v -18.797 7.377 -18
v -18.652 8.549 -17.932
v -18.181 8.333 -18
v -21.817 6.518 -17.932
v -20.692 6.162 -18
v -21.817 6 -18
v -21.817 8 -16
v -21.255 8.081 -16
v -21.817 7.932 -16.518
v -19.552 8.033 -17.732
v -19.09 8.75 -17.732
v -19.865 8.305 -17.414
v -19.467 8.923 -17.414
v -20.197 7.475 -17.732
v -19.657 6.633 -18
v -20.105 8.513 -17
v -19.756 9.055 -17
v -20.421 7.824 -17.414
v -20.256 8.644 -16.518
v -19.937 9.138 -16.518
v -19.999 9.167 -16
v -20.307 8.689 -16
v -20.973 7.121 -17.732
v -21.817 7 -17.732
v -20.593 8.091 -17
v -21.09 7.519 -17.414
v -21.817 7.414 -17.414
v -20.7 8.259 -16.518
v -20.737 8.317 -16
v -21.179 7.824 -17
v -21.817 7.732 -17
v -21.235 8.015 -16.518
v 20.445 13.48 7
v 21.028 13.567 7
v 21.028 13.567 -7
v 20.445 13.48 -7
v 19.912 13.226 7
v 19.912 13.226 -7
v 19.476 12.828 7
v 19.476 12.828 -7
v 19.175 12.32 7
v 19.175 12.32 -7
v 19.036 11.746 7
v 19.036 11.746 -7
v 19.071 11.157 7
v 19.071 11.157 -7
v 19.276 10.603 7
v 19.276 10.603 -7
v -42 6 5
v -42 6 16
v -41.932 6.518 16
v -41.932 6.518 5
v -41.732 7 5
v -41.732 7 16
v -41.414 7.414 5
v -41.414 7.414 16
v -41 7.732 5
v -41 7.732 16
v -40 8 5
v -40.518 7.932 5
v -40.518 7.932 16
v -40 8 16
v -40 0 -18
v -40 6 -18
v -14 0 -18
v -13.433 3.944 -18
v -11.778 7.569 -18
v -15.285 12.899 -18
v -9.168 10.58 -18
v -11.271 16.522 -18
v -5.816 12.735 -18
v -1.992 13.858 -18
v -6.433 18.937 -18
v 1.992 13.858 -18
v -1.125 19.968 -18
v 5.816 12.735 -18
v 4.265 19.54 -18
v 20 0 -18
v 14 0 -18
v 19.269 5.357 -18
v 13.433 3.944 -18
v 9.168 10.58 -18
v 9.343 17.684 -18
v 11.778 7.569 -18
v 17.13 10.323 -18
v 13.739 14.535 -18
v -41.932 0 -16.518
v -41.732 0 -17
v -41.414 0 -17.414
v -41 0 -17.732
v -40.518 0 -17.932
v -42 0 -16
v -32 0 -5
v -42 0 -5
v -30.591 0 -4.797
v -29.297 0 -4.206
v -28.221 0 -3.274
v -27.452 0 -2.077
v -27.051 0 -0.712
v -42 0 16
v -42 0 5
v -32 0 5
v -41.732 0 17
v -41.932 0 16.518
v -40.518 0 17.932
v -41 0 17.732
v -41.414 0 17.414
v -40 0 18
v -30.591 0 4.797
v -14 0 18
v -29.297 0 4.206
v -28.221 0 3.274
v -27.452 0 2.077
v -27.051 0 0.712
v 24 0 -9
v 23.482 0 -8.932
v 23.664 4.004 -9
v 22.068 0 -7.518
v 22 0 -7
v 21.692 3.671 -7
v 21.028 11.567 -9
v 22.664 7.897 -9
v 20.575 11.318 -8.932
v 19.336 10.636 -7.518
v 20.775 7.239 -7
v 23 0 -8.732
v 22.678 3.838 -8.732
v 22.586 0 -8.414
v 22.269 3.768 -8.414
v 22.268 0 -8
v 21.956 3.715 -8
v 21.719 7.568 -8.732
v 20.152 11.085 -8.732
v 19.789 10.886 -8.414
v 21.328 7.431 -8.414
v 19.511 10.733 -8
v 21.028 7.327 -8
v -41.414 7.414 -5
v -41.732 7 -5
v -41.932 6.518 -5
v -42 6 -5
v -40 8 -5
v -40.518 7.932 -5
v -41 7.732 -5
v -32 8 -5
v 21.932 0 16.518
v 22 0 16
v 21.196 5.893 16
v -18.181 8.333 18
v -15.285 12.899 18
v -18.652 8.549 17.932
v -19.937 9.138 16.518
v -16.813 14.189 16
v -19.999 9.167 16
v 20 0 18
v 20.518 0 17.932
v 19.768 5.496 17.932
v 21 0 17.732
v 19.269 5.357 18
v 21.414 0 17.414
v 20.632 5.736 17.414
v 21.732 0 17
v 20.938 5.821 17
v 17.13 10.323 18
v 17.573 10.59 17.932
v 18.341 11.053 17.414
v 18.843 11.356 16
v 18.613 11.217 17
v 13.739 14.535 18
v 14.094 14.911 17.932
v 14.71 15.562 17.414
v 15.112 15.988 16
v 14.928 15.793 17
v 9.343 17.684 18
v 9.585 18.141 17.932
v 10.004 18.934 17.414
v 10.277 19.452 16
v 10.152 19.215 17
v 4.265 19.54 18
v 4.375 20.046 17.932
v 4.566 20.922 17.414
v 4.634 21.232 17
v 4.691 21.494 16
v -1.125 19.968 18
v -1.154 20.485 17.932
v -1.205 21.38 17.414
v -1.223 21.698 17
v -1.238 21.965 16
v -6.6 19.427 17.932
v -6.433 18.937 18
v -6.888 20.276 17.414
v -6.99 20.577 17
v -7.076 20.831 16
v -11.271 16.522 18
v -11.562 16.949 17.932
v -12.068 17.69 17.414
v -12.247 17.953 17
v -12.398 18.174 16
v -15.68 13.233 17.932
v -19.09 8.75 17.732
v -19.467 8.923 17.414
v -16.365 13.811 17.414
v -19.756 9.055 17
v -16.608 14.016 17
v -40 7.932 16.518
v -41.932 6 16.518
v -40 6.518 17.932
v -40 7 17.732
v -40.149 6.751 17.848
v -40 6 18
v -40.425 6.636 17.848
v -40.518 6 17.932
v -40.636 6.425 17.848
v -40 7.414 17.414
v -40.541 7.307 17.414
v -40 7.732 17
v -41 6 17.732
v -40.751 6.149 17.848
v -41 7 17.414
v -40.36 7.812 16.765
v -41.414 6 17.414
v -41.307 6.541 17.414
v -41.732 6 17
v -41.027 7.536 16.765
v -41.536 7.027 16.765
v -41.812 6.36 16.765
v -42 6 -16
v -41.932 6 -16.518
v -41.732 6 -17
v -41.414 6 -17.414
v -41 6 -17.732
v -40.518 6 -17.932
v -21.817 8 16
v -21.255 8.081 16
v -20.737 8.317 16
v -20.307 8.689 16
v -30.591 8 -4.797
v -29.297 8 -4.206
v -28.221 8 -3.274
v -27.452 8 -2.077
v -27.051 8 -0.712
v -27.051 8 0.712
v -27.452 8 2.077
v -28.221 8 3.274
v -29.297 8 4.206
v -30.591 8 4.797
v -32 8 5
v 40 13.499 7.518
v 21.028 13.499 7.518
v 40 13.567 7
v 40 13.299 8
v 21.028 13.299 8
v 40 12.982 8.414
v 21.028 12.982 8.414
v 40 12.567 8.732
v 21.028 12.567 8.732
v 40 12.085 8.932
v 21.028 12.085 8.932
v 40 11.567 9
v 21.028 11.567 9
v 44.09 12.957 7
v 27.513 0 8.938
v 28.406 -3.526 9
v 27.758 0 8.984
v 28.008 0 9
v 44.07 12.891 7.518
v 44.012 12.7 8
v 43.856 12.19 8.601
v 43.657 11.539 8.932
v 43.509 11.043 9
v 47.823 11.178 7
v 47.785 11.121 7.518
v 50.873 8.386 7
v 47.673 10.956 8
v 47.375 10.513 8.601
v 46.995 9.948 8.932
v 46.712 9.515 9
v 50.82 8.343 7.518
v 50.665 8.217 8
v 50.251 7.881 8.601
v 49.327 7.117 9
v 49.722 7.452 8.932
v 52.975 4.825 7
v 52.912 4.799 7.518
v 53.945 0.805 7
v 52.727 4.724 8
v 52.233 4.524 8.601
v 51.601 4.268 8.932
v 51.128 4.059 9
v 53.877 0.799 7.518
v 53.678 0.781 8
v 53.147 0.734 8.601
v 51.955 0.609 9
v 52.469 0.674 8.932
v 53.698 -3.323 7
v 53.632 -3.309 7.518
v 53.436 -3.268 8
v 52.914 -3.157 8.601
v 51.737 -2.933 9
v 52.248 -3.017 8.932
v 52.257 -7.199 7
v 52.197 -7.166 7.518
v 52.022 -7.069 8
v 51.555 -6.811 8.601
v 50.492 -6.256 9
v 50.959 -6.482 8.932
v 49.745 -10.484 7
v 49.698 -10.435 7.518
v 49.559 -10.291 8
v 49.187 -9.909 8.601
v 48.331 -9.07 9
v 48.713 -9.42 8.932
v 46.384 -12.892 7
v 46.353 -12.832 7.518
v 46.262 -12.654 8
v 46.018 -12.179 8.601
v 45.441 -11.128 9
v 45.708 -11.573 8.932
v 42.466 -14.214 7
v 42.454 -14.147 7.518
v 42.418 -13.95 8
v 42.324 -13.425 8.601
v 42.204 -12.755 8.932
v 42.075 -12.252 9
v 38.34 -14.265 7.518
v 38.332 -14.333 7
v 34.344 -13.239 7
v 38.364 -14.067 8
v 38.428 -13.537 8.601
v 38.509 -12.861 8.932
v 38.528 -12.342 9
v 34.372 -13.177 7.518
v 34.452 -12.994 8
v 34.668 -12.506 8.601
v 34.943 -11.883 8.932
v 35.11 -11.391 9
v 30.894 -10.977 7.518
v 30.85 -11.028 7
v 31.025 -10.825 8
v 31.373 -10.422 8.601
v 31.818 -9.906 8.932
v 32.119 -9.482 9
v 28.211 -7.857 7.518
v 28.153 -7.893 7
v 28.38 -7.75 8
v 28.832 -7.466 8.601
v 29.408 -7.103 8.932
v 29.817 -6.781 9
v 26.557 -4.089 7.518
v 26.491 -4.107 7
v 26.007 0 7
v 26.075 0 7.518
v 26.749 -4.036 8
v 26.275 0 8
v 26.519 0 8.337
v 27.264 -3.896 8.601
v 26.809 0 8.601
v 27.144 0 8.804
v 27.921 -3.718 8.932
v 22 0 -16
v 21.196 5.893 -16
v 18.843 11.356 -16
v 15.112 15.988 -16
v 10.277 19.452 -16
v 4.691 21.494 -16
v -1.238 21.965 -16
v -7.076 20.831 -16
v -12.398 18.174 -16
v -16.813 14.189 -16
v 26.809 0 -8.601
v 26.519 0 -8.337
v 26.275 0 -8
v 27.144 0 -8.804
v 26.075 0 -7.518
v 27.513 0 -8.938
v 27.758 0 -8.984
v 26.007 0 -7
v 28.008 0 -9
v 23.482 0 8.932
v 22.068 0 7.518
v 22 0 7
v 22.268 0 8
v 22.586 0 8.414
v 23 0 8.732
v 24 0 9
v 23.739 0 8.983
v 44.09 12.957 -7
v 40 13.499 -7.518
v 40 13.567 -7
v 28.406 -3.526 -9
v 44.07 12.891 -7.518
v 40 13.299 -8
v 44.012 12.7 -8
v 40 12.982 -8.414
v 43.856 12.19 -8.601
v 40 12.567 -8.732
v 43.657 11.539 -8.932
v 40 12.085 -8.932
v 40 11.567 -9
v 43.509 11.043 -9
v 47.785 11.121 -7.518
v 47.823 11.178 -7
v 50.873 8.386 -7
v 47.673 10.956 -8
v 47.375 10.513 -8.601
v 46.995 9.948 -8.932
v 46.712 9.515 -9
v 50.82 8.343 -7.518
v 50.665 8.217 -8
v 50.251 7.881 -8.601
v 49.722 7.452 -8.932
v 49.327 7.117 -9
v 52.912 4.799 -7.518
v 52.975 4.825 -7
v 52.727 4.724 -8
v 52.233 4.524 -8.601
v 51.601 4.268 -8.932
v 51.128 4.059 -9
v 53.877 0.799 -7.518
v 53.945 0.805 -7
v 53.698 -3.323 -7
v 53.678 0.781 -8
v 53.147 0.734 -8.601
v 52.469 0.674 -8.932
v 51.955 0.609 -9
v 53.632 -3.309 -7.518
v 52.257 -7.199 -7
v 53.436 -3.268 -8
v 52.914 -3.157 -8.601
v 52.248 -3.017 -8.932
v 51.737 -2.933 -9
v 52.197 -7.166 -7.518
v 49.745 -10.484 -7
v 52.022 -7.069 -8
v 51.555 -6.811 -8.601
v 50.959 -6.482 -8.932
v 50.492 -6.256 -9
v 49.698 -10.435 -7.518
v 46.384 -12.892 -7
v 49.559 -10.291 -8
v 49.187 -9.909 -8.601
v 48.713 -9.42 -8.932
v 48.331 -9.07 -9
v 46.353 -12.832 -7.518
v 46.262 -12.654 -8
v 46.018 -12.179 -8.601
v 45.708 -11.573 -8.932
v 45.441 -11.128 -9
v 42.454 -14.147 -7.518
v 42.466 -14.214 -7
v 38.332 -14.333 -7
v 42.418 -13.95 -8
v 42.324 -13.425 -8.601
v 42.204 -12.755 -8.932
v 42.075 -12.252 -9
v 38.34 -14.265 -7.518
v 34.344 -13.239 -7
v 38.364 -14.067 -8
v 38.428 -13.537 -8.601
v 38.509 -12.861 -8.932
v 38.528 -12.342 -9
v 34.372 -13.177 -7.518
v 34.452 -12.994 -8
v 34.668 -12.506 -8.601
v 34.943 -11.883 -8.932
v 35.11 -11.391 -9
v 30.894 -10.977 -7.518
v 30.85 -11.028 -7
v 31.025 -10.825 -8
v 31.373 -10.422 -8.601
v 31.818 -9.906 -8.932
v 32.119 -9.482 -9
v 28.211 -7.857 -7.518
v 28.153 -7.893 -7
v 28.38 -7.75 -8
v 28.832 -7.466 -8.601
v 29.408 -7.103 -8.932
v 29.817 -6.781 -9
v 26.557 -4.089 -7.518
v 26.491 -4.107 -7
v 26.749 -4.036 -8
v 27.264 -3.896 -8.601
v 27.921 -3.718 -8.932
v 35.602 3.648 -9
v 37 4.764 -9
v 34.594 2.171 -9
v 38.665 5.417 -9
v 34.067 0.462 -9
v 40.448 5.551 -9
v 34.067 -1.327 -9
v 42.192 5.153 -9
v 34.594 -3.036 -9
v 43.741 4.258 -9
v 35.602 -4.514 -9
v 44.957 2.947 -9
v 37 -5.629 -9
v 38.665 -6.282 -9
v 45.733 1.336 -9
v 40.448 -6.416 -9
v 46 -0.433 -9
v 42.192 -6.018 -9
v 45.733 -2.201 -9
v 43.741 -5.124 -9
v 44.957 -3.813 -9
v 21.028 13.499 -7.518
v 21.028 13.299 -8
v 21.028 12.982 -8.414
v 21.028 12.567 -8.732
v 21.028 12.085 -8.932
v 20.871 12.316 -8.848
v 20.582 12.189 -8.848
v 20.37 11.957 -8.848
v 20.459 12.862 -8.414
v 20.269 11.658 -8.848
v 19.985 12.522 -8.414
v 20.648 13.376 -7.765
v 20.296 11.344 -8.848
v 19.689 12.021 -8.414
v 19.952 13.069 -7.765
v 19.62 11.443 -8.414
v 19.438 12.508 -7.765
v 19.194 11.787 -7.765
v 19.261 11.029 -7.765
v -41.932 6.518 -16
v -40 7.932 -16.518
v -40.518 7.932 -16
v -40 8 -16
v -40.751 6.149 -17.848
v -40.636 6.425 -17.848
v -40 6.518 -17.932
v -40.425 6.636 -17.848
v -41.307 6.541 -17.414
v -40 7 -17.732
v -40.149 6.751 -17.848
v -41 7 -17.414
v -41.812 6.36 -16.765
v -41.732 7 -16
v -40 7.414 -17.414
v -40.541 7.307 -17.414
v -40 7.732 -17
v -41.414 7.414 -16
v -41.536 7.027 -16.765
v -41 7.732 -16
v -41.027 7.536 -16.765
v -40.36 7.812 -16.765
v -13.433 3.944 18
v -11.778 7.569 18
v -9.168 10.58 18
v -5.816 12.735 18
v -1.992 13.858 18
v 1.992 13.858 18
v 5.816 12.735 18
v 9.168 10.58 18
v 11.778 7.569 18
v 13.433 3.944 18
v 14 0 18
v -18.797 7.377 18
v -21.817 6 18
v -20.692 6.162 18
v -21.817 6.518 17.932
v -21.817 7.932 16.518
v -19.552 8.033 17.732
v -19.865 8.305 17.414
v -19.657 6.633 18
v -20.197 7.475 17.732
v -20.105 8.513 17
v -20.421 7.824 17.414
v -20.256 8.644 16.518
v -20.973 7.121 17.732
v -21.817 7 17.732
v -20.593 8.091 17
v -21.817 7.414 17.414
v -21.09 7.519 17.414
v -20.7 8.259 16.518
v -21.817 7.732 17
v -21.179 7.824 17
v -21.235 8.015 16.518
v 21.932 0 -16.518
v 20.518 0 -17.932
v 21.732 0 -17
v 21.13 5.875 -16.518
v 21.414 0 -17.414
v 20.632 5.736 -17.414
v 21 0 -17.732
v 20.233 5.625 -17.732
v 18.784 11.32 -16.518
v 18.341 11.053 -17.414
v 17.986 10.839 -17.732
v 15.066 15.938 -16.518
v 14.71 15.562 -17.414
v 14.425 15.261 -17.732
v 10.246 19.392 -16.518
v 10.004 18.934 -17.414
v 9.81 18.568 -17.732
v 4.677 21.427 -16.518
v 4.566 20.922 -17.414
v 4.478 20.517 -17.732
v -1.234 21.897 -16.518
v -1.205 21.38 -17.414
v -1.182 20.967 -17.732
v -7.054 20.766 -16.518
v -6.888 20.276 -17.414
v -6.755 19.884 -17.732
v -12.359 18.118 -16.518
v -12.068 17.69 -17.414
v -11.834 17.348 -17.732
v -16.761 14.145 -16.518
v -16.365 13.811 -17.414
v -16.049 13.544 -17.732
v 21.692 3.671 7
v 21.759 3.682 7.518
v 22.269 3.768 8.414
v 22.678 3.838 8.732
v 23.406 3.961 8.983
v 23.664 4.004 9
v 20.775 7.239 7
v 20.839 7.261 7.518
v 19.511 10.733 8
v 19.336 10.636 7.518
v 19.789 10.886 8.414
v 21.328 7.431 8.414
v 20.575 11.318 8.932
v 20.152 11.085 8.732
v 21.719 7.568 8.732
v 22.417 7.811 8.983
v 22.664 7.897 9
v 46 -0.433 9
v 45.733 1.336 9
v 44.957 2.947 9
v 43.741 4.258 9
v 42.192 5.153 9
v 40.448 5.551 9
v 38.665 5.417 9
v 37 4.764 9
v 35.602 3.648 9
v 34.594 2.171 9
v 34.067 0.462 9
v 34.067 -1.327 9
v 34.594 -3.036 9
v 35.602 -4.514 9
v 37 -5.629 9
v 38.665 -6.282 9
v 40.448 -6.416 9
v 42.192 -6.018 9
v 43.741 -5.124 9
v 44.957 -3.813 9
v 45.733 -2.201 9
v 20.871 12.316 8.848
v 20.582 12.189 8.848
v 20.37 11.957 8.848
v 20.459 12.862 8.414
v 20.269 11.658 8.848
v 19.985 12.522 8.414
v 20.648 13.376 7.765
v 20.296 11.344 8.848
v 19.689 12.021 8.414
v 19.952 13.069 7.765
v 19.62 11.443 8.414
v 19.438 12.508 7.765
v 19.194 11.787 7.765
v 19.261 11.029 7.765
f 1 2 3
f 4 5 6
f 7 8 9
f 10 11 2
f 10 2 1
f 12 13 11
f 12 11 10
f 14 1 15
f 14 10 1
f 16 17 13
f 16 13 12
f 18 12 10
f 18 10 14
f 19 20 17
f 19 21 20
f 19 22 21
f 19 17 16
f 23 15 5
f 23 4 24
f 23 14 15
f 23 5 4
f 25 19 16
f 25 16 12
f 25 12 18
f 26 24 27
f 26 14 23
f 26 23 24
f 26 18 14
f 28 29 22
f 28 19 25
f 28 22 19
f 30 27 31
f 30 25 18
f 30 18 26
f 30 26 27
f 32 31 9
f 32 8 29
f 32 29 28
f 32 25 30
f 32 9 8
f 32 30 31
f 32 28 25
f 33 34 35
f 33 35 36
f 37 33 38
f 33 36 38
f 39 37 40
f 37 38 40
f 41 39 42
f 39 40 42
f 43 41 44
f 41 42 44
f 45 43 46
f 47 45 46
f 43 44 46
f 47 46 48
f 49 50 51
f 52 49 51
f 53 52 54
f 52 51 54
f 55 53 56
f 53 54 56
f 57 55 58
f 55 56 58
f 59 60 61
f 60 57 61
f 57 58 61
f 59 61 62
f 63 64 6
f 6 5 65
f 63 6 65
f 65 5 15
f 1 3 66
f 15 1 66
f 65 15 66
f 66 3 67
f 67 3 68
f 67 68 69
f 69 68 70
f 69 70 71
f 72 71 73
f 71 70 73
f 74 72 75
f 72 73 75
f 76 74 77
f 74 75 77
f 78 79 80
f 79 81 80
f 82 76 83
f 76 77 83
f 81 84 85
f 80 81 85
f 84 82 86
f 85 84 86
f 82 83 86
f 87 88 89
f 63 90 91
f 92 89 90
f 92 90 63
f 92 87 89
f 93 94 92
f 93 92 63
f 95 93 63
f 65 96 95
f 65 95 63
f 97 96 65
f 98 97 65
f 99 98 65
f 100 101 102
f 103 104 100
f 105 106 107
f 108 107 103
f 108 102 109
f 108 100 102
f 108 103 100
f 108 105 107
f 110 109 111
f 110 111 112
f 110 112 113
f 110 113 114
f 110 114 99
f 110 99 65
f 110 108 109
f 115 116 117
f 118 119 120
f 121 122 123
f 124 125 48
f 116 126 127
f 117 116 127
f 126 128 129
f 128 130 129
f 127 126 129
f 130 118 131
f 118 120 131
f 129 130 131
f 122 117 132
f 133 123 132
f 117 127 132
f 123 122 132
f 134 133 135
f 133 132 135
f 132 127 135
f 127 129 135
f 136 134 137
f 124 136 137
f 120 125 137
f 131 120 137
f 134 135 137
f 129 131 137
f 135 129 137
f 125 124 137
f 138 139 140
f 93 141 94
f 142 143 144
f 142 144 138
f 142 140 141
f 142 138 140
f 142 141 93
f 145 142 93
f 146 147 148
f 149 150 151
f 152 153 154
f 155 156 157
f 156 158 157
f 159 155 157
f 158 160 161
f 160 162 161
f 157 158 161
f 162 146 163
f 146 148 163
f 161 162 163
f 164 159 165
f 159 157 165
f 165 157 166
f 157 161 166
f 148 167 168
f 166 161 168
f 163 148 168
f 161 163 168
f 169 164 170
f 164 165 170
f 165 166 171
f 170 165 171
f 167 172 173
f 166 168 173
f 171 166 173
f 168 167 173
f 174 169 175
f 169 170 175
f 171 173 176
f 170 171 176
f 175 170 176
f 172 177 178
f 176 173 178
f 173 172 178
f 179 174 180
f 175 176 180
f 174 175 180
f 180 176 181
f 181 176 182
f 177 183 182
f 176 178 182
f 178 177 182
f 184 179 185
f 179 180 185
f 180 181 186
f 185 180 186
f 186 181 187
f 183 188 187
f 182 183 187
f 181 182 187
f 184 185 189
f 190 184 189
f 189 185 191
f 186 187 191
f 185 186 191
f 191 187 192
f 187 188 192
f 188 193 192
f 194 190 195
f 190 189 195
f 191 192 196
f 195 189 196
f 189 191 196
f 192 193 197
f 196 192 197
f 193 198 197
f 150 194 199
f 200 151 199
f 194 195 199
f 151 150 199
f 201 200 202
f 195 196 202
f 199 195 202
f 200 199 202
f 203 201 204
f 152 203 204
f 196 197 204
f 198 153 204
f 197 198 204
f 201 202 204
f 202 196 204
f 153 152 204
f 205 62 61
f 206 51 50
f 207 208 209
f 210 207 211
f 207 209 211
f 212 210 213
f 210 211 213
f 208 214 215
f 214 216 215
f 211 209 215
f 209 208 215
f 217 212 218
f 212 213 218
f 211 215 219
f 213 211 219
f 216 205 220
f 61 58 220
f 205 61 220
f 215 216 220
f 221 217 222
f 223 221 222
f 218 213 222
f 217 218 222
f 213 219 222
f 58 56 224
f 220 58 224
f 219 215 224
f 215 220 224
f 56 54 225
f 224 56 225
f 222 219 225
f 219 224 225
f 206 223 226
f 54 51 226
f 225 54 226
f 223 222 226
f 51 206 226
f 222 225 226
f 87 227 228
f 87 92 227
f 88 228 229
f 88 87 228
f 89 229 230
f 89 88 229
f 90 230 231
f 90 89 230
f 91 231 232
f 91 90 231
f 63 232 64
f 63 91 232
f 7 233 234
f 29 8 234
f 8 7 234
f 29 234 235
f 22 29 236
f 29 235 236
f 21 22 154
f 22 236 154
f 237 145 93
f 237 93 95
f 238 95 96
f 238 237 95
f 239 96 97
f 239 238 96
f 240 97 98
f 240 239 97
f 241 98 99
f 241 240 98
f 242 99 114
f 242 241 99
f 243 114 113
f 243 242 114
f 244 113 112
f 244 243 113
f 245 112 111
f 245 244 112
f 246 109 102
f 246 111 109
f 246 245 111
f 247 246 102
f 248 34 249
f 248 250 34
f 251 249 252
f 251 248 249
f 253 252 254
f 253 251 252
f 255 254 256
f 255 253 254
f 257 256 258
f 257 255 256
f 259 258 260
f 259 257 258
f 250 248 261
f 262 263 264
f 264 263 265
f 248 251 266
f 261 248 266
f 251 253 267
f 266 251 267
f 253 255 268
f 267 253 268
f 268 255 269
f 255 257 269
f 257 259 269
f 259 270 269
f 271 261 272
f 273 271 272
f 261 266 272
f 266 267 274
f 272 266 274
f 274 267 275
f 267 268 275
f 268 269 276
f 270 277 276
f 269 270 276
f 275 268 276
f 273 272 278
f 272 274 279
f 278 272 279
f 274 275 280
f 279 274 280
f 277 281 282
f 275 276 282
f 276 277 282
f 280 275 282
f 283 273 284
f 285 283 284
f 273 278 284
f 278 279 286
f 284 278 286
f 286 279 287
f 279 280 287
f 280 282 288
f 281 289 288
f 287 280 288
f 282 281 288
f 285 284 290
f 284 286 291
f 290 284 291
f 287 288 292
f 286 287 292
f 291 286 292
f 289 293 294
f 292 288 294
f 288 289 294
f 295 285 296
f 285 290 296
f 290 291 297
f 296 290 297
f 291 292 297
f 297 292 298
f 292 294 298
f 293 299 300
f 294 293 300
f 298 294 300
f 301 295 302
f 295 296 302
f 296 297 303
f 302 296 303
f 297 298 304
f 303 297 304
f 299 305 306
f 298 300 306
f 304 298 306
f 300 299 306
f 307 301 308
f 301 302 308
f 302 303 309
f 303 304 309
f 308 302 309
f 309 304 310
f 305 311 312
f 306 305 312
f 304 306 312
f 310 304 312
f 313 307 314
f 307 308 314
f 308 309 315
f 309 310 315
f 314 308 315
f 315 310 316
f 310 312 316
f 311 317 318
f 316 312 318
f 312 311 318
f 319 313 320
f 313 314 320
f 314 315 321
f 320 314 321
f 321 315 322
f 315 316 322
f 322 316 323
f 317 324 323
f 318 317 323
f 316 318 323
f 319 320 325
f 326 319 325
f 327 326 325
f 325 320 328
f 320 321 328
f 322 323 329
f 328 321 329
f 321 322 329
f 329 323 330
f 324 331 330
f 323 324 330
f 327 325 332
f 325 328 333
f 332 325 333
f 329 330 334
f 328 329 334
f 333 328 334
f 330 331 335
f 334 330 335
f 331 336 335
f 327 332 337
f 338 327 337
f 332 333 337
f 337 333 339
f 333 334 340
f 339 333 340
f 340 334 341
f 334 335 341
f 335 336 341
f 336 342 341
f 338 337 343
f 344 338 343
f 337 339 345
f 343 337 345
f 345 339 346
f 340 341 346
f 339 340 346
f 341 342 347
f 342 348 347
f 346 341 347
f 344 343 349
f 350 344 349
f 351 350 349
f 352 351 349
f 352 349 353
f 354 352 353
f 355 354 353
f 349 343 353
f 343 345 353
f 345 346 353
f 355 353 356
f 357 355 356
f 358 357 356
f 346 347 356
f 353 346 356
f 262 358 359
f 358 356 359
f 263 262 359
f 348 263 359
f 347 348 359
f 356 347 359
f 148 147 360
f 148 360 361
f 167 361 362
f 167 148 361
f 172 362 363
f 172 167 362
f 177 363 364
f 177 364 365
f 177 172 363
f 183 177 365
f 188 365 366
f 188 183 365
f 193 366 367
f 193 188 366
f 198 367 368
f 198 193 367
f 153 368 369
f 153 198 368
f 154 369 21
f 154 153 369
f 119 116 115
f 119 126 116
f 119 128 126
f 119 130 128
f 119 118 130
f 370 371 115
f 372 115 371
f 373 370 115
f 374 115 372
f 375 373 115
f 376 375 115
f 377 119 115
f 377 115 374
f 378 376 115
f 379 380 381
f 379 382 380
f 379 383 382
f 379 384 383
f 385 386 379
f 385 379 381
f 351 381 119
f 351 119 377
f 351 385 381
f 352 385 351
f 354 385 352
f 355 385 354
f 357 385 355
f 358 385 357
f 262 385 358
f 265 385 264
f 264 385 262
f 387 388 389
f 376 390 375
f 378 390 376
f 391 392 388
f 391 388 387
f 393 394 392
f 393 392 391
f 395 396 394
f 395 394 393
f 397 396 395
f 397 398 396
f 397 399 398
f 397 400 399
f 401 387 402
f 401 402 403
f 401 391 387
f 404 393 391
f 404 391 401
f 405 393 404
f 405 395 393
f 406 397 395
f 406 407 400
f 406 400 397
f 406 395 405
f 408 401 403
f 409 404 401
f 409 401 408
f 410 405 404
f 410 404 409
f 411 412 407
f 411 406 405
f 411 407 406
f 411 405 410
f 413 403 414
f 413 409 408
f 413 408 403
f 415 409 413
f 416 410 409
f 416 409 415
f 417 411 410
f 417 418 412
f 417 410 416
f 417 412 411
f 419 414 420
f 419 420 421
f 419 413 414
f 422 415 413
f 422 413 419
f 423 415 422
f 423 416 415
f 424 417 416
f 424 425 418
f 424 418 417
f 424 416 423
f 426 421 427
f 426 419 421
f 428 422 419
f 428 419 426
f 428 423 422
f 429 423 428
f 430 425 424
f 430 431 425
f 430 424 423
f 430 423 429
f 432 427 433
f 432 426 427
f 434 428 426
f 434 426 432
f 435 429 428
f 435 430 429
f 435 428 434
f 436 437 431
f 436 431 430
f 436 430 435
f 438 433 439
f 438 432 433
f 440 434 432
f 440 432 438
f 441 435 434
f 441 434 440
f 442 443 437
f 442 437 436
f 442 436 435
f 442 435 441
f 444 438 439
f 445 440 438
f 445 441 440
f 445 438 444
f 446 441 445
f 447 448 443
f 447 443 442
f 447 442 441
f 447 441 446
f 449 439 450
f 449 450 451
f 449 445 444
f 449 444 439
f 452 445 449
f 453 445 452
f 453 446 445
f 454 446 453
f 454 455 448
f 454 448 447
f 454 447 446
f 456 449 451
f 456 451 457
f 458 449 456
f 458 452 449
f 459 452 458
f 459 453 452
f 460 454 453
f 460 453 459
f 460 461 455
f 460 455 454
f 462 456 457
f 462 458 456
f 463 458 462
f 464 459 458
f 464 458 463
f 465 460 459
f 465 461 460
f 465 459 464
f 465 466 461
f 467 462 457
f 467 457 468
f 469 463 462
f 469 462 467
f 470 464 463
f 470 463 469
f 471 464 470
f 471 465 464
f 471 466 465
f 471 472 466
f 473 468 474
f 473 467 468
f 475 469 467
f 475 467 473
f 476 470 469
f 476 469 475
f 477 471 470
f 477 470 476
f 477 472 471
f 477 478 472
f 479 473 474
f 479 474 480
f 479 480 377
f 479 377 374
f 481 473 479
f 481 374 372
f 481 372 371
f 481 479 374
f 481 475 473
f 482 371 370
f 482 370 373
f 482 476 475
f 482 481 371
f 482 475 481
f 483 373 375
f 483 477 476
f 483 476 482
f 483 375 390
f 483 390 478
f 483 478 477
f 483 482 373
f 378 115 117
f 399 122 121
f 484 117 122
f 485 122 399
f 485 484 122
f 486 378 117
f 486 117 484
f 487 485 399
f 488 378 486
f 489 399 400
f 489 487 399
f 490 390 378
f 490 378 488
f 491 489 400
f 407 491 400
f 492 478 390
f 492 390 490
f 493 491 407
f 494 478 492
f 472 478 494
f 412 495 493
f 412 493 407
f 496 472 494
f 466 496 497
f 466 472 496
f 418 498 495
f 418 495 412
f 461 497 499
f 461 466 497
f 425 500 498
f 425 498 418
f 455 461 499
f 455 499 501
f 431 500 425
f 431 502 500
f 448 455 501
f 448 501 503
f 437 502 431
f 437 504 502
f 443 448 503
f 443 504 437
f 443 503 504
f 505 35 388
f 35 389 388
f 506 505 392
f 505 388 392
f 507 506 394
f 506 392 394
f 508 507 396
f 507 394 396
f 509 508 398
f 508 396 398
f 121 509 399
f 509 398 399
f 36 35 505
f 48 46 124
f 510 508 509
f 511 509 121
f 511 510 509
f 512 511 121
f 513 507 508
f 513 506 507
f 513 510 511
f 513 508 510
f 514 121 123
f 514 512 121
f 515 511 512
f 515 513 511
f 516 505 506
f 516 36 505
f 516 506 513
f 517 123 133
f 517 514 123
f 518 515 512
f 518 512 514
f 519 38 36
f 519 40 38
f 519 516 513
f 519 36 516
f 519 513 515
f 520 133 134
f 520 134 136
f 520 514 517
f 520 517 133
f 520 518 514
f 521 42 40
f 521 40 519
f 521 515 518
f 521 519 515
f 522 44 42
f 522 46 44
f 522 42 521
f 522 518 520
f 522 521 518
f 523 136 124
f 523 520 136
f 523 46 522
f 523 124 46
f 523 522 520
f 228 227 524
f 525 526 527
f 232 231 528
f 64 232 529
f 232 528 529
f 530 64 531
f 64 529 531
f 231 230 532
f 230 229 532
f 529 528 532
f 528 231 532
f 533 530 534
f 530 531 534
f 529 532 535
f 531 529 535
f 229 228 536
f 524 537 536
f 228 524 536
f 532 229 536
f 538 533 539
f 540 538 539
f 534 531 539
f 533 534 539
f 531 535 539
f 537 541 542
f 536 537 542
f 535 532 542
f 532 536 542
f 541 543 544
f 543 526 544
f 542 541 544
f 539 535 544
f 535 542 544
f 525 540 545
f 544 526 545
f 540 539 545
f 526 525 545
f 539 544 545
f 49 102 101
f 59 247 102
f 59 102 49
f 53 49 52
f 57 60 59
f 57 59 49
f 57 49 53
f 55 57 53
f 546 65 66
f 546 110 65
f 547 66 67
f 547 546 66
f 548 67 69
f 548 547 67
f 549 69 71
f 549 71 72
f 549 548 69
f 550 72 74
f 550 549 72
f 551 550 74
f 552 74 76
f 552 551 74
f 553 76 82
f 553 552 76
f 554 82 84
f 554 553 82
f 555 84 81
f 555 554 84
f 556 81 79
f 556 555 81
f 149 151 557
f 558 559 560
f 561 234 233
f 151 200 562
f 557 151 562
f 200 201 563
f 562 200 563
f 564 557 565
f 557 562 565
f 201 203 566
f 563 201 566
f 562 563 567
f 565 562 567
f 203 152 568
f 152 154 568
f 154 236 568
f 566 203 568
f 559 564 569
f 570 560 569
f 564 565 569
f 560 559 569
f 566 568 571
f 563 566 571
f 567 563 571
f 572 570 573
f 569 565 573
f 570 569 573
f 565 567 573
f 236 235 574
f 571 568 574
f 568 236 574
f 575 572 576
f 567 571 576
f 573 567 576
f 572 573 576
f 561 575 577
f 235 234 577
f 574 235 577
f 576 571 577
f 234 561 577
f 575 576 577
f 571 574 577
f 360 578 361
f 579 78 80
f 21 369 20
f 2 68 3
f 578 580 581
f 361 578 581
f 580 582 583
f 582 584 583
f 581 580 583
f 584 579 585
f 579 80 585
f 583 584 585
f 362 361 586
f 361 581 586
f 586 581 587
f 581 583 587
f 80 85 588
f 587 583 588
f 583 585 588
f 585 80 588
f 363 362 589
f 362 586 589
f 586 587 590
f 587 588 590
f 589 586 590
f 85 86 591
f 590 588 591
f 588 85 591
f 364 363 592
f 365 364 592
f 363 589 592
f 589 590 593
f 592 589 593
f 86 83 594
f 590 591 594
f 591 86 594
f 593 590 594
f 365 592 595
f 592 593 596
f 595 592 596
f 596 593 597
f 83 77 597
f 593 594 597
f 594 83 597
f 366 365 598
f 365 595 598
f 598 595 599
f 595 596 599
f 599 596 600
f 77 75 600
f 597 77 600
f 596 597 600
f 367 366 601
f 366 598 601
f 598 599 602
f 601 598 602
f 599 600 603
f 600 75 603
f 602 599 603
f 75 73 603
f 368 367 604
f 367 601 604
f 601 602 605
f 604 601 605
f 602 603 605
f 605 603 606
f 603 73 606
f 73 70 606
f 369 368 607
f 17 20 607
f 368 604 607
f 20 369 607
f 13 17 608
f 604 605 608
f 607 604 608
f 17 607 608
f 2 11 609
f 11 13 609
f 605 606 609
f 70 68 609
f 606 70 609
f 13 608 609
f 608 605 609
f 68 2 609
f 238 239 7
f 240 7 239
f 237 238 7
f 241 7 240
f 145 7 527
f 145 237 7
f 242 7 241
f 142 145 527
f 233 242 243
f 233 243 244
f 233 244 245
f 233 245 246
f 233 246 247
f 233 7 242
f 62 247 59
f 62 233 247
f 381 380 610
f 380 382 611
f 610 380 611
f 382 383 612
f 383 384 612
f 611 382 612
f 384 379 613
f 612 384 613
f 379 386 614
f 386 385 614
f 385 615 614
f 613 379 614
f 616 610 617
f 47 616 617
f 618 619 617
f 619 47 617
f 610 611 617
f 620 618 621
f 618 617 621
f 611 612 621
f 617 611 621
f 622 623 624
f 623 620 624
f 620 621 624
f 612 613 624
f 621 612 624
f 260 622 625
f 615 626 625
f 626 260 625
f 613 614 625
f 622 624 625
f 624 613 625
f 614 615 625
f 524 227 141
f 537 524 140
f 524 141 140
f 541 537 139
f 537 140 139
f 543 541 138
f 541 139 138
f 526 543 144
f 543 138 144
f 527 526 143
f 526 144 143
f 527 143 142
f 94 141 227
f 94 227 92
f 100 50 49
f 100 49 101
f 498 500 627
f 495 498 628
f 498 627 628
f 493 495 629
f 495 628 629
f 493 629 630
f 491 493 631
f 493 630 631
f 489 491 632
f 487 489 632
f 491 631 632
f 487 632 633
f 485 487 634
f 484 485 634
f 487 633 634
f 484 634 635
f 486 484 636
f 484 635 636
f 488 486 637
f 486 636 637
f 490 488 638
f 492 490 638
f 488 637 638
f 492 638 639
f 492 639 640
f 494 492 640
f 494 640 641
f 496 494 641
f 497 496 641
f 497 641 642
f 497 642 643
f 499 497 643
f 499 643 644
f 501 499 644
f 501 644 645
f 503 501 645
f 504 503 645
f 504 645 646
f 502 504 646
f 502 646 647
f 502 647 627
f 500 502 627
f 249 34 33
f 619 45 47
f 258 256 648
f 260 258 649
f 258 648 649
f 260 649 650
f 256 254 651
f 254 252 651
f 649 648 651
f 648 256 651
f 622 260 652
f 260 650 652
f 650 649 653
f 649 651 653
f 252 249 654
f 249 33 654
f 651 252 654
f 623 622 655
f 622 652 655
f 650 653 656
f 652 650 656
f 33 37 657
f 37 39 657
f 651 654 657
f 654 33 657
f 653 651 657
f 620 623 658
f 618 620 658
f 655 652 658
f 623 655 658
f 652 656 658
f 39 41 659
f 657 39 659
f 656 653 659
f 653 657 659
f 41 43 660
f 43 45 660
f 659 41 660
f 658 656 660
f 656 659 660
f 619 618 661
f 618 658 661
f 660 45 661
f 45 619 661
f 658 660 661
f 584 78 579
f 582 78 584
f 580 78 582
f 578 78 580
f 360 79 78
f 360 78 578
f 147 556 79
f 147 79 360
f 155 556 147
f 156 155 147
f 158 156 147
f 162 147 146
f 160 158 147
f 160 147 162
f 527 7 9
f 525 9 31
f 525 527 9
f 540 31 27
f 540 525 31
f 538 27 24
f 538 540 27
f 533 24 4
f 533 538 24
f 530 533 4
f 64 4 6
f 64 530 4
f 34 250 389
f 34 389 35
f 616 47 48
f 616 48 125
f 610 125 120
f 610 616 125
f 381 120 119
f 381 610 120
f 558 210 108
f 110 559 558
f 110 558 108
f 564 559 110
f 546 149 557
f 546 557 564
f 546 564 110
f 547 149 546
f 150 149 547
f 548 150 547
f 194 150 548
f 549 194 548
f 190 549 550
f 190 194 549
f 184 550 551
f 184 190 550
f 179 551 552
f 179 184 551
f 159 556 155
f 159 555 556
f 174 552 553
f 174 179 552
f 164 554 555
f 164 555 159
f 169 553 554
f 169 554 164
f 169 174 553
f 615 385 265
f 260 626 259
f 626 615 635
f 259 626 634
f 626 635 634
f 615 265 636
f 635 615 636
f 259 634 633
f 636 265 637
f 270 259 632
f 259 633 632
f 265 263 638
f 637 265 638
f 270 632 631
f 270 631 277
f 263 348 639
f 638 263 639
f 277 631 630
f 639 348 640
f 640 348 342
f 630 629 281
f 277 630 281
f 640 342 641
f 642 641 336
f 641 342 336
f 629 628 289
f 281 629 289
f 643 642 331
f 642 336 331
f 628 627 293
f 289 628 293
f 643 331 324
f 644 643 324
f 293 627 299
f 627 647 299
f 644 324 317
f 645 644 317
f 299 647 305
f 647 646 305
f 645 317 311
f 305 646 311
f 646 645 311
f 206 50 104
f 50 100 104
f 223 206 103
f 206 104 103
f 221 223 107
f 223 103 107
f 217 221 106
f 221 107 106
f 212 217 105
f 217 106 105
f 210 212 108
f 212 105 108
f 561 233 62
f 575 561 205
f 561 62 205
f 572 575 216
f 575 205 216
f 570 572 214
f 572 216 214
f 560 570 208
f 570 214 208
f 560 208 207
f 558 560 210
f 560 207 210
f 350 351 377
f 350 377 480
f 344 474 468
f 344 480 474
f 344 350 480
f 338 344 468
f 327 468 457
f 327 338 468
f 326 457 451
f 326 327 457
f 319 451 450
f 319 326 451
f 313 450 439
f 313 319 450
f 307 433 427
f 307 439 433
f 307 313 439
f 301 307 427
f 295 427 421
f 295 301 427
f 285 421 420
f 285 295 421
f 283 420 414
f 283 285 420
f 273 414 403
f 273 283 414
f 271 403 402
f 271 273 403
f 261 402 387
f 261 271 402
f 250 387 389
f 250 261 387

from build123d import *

# Parameters (mm, degrees)
EXTRUDE_1_DEPTH     = 18
SKETCH_4_R          = 6
EXTRUDE_4_DEPTH     = 36
CUT_EXTRUDE_START   = -28
SKETCH_7_W          = 36.681614088
SKETCH_7_H          = 9
CUT_EXTRUDE_5_DEPTH = 28
FILLET_1_R          = 2
CUT_EXTRUDE_6_DEPTH = 62.181883925
FILLET_2_R          = 2


with BuildPart() as part:
    # 草圖1 → 填料-伸長1 (new, symmetric)
    with BuildSketch(Plane.XY):
        with BuildLine():
            Line((14, 0), (22, 0))
            ThreePointArc((22, 0), (4.070268191, 21.620196966), (-20.493901532, 8))
            Line((-20.493901532, 8), (-42, 8))
            Line((-42, 8), (-42, 0))
            Line((-42, 0), (-14, 0))
            ThreePointArc((-14, 0), (0, 14), (14, 0))
        make_face()
    extrude(amount=EXTRUDE_1_DEPTH, both=True)

    # 圓角1
    fillet_1_edges = [part.edges().sort_by_distance(p)[0] for p in [
        (-20.493901532, 8, 0),
        (-42, 8, 0),
        (4.070268191, 21.620196966, 18),
        (-31.246950766, 8, 18),
        (4.070268191, 21.620196966, -18),
        (-42, 4, 18),
        (-42, 4, -18),
        (-31.246950766, 8, -18),
    ]]
    fillet(fillet_1_edges, radius=FILLET_1_R)

    # 草圖2 → 除料-伸長6 (cut, through all)
    with BuildSketch(Plane(origin=(0, 8, 0), x_dir=(1, 0, 0), z_dir=(0, 1, 0))):
        with BuildLine():
            Line((-42, -5), (-42, 5))
            Line((-42, 5), (-32, 5))
            ThreePointArc((-32, 5), (-27, 0), (-32, -5))
            Line((-32, -5), (-42, -5))
        make_face()
    extrude(amount=-CUT_EXTRUDE_6_DEPTH, mode=Mode.SUBTRACT)


with BuildPart() as body_2:
    # 草圖4 → 填料-伸長4 (new body)
    with BuildSketch(Plane.XY.offset(18)):
        with BuildLine():
            Line((40, 13.567369288), (17.318385912, 13.567369288))
            ThreePointArc((17.318385912, 13.567369288), (20.796688319, 7.176193627), (22, 0))
            Line((22, 0), (26.006686216, 0))
            ThreePointArc((26.006686216, 0), (49.745336578, -10.483919932), (40, 13.567369288))
        make_face()
        with Locations((40, -0.432630712)):
            Circle(SKETCH_4_R, mode=Mode.SUBTRACT)
    extrude(amount=-EXTRUDE_4_DEPTH)

    # 草圖7 → 除料-伸長5 (cut)
    with BuildSketch(Plane(origin=(0, 13.567369288, 0), x_dir=(1, 0, 0), z_dir=(0, 1, 0)).offset(CUT_EXTRUDE_START)):
        with Locations((35.659192956, 13.5)):
            Rectangle(SKETCH_7_W, SKETCH_7_H)
        with Locations((35.659192956, -13.5)):
            Rectangle(SKETCH_7_W, SKETCH_7_H)
    extrude(amount=CUT_EXTRUDE_5_DEPTH, mode=Mode.SUBTRACT)

    # 圓角2
    fillet_2_edges = [body_2.edges().sort_by_distance(p)[0] for p in [
        (17.318385912, 13.567369288, 0),
        (28.659192956, 13.567369288, -9),
        (20.796688319, 7.176193627, -9),
        (49.745336578, -10.483919932, -9),
        (28.659192956, 13.567369288, 9),
        (49.745336578, -10.483919932, 9),
        (20.796688319, 7.176193627, 9),
    ]]
    fillet(fillet_2_edges, radius=FILLET_2_R)


solid = Compound([part.part, body_2.part])
